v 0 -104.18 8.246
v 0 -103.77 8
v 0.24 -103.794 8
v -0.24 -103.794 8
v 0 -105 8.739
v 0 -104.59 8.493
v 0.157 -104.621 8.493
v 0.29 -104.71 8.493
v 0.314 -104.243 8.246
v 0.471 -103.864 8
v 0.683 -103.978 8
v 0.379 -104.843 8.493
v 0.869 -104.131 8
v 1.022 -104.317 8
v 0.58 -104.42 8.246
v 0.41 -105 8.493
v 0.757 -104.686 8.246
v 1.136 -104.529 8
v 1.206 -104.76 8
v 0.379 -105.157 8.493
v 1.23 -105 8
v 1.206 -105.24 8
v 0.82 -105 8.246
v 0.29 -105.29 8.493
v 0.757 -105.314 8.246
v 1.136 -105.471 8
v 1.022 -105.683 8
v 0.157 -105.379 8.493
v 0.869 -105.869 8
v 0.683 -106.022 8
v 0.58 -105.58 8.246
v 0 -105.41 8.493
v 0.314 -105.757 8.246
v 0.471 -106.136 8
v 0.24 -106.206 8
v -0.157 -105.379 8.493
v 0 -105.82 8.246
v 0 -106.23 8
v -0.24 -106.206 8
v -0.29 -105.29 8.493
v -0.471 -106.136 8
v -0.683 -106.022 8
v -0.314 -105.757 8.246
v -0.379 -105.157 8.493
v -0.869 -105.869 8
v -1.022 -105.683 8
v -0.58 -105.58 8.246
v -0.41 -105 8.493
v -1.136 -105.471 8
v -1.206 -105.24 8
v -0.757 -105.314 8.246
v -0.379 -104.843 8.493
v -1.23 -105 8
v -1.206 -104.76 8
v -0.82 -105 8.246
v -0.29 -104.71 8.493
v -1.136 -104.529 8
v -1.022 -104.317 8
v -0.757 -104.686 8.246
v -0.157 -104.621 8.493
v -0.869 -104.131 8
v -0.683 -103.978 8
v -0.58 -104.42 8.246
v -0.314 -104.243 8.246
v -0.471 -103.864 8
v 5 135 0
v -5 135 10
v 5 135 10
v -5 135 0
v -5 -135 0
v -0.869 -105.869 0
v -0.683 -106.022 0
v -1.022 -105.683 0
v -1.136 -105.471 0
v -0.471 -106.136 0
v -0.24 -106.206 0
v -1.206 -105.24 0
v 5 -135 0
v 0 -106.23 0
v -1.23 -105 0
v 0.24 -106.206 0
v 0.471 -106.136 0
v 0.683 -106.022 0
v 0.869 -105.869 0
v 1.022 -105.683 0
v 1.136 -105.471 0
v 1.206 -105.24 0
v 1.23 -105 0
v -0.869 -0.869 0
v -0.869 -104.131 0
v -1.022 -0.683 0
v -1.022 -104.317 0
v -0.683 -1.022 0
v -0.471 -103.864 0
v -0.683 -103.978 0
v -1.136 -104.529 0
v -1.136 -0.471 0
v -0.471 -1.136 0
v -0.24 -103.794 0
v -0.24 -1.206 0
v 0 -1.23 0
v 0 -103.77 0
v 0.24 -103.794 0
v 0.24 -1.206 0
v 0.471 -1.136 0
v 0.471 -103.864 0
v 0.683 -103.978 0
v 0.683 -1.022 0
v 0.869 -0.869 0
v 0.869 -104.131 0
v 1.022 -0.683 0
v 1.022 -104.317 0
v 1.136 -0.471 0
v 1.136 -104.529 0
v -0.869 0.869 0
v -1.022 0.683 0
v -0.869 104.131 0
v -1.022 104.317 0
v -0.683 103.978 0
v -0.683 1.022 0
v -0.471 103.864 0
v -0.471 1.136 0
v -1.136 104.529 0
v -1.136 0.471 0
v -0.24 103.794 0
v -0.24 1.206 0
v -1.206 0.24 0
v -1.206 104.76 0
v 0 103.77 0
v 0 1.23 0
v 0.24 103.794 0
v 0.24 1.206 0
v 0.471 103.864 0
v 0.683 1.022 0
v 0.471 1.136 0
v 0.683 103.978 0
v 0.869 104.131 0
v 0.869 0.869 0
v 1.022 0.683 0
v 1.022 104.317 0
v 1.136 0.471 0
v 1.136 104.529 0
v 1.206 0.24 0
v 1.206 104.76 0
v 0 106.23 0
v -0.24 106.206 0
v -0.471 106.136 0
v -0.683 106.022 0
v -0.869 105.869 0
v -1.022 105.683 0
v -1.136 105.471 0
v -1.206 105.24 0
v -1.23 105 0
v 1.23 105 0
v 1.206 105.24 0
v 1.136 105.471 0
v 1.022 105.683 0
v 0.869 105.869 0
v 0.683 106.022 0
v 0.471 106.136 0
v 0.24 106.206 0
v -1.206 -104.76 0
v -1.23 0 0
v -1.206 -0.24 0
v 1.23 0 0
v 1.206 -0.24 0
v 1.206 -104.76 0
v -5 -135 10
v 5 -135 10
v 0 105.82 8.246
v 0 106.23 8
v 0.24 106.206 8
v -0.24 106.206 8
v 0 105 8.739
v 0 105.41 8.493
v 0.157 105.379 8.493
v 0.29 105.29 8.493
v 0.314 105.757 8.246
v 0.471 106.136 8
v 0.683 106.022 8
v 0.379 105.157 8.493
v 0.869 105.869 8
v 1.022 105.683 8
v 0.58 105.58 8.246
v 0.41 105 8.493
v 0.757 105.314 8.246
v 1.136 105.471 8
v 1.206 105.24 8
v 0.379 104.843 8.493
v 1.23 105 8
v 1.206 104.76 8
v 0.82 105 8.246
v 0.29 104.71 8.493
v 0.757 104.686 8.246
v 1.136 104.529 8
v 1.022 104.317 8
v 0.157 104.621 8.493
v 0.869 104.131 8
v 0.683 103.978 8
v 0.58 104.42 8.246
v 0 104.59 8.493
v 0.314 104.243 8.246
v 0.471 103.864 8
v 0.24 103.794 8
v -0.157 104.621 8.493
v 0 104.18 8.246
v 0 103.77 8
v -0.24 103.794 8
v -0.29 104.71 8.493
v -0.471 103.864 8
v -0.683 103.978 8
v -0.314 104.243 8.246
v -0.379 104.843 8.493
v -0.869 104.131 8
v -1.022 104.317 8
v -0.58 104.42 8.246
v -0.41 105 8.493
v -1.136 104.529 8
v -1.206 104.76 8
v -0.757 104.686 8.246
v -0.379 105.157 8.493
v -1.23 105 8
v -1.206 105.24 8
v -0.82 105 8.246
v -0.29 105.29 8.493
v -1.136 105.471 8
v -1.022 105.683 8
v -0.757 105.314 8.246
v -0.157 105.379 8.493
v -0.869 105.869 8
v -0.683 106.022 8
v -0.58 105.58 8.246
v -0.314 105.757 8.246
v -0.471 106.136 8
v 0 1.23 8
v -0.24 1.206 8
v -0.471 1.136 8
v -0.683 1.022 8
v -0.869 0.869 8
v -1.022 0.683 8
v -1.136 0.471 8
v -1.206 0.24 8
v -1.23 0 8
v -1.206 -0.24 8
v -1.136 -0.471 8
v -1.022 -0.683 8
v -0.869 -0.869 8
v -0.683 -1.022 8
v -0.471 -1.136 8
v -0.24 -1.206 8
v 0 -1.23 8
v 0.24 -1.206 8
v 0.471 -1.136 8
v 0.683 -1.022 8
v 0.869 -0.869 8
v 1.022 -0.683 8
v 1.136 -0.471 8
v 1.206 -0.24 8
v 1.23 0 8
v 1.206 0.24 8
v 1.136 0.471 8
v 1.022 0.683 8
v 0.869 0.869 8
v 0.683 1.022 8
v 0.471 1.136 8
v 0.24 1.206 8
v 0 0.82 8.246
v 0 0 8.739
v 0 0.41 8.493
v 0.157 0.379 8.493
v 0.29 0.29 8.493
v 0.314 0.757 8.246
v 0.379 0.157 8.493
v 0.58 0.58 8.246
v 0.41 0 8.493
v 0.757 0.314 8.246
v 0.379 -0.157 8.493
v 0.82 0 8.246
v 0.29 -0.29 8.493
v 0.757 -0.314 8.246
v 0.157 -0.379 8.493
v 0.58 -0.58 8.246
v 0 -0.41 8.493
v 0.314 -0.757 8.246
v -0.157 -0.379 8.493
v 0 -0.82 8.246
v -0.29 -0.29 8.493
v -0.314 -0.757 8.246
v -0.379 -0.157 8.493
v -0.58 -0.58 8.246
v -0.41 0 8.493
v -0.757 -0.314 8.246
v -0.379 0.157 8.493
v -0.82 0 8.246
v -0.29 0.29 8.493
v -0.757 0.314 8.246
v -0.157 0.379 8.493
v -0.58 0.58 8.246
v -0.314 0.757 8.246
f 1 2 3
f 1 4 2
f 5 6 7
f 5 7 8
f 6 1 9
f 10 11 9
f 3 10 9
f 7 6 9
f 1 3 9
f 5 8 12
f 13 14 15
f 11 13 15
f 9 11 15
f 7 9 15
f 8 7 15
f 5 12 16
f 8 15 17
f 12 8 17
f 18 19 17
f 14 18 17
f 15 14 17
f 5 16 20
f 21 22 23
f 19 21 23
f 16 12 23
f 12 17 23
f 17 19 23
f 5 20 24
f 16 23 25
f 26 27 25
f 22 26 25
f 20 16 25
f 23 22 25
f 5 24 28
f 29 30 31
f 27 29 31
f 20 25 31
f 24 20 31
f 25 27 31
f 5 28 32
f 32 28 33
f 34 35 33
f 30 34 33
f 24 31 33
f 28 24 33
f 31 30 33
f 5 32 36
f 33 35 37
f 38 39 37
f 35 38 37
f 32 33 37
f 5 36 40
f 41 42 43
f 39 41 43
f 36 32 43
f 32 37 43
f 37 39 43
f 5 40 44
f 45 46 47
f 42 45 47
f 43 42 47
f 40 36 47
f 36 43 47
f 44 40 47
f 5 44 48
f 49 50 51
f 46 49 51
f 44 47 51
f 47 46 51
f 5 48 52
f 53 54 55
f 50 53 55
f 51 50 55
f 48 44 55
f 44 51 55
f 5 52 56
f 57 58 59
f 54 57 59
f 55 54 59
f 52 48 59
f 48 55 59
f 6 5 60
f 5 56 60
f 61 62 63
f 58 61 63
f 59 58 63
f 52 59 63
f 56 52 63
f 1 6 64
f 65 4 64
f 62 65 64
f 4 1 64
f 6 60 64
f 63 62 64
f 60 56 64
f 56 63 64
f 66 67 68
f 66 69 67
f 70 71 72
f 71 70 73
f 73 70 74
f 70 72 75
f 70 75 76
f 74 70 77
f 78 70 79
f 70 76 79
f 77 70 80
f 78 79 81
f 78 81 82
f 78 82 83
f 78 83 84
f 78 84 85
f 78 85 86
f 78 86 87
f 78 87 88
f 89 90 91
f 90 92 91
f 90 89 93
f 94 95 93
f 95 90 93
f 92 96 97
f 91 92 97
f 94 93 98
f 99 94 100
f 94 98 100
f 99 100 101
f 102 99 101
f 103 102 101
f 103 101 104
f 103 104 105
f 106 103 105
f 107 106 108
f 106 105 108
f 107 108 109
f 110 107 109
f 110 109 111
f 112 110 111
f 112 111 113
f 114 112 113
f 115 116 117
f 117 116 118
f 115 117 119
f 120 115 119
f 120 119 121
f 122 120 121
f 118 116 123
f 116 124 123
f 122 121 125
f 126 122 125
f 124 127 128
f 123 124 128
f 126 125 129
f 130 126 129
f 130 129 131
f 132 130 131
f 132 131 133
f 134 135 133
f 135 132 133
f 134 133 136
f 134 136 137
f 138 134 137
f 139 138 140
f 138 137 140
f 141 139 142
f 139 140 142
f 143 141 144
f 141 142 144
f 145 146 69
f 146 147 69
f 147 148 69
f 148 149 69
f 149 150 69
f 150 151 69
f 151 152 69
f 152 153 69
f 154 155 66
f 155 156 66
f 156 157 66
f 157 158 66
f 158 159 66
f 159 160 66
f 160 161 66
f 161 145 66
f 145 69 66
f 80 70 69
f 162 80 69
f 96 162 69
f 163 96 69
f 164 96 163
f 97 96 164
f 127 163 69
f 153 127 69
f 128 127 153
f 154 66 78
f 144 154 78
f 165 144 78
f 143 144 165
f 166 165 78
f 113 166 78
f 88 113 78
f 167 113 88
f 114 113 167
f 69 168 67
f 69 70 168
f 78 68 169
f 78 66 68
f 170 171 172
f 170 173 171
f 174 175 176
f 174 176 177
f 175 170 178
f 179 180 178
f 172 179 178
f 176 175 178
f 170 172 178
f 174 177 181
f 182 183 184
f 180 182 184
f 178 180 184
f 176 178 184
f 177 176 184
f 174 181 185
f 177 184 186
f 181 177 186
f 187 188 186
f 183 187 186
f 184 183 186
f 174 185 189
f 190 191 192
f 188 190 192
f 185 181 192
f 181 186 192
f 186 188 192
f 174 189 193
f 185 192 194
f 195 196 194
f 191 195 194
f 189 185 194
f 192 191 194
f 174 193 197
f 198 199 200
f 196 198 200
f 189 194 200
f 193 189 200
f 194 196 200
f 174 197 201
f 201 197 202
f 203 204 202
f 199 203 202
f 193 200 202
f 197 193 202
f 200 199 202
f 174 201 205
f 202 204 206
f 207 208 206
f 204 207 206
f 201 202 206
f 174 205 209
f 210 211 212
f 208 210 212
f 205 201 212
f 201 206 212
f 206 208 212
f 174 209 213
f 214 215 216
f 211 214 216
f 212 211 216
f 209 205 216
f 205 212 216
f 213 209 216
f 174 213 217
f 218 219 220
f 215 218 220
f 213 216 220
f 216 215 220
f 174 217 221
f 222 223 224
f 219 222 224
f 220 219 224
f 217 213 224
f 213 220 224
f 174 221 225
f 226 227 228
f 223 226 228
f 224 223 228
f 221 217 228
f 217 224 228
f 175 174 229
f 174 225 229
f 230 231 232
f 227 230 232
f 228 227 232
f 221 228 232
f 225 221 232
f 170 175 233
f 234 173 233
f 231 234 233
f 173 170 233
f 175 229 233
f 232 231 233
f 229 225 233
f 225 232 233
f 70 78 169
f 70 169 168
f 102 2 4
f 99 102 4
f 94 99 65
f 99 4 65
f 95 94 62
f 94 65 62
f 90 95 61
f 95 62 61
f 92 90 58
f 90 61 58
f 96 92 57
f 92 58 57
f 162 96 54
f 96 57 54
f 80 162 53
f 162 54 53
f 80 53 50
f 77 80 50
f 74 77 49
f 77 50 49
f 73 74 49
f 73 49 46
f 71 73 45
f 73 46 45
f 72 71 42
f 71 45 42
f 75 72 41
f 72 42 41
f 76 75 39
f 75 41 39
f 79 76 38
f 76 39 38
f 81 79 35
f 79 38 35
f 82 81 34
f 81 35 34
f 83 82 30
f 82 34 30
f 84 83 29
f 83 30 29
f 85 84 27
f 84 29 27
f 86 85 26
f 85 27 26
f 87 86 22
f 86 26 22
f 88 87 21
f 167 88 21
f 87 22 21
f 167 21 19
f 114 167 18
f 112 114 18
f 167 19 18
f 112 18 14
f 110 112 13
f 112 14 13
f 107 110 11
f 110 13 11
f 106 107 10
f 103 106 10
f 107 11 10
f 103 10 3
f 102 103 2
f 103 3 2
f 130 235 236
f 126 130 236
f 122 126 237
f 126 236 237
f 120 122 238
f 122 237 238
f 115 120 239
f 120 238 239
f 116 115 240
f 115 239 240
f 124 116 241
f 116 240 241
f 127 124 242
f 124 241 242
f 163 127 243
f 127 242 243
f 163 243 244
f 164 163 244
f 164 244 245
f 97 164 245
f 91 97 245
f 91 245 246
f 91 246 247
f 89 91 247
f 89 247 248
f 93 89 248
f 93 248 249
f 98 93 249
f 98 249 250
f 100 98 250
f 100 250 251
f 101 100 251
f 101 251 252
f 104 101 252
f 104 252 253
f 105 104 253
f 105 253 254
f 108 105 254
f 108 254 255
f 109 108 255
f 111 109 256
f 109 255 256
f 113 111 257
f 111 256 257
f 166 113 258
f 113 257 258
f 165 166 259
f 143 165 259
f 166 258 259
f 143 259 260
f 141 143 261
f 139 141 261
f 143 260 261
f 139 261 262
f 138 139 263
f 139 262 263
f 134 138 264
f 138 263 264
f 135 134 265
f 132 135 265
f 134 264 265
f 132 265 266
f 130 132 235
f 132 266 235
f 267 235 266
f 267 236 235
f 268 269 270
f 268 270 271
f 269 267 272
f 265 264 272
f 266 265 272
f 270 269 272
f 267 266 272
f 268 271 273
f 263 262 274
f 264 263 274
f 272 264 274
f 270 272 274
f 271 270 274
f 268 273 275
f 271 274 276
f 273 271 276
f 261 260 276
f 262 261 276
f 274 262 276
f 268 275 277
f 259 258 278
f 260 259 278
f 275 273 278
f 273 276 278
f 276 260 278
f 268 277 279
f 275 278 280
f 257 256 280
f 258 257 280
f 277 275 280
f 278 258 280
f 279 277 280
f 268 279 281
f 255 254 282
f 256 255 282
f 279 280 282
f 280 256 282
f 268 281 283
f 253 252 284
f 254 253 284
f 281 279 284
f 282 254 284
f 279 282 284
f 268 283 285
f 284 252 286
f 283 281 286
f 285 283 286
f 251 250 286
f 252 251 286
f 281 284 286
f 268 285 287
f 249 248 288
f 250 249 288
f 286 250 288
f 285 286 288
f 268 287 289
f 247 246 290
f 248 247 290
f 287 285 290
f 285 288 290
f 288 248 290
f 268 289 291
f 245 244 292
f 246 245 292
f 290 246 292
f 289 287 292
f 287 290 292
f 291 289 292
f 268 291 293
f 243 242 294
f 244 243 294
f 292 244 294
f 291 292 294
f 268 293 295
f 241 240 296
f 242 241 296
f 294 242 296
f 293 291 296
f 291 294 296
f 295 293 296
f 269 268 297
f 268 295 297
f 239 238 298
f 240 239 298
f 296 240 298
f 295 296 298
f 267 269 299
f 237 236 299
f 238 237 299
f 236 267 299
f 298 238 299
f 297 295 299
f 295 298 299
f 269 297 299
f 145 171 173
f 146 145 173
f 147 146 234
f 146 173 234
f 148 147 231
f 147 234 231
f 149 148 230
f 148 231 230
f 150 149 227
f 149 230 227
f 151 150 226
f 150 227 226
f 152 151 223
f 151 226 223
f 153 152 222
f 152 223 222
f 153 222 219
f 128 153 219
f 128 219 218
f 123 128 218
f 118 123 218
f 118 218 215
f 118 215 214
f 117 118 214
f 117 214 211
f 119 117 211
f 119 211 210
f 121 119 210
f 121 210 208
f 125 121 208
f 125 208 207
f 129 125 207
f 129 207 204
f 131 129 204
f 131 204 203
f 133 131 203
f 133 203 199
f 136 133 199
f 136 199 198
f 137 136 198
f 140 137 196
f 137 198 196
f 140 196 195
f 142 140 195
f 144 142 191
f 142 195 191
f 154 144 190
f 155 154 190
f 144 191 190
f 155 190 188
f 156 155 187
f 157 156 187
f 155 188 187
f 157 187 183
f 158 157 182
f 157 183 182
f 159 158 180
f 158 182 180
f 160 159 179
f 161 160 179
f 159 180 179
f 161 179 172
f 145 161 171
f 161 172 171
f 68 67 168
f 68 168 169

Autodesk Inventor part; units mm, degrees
ref_plane "YZ Plane" through (0, 0, 0) normal (1, 0, 0) x (0, 1, 0)
ref_plane "XZ Plane" through (0, 0, 0) normal (0, 1, 0) x (-1, 0, 0)
ref_plane "XY Plane" through (0, 0, 0) normal (0, 0, 1) x (1, 0, 0)
sketch "Esboço1" plane through (0, 0, 0) normal (0, 0, 1) x (1, 0, 0)
  line L0 (-7, 0) -> (7, 0) construction
  line L1 (0, -189) -> (0, 189) construction
  line L2 (-5, 135) -> (5, 135)
  line L3 (5, 135) -> (5, -135)
  line L4 (5, -135) -> (-5, -135)
  line L5 (-5, -135) -> (-5, 135)
  point P0 (0, 0)
  point P1 (0, -105)
  point P2 (0, 0)
  point P3 (0, 105)
  dimension "d0" = 10
  dimension "d1" = 270
  dimension "d4" = 105
extrude "Extrusão1" add sketch "Esboço1" along normal blind 10
hole "Furo1" at (0, -105, 0) at (0, 0, 0) at (0, 105, 0) direction (0, 0, 1) diameter 2.459 depth 8 tip angle 118 thread size "M3x0.5" class "6H" standard "ISO Metric profile"
equation "\"d2\" = d0"
properties part number "VEJ-00-013" material "Durastone BK"
